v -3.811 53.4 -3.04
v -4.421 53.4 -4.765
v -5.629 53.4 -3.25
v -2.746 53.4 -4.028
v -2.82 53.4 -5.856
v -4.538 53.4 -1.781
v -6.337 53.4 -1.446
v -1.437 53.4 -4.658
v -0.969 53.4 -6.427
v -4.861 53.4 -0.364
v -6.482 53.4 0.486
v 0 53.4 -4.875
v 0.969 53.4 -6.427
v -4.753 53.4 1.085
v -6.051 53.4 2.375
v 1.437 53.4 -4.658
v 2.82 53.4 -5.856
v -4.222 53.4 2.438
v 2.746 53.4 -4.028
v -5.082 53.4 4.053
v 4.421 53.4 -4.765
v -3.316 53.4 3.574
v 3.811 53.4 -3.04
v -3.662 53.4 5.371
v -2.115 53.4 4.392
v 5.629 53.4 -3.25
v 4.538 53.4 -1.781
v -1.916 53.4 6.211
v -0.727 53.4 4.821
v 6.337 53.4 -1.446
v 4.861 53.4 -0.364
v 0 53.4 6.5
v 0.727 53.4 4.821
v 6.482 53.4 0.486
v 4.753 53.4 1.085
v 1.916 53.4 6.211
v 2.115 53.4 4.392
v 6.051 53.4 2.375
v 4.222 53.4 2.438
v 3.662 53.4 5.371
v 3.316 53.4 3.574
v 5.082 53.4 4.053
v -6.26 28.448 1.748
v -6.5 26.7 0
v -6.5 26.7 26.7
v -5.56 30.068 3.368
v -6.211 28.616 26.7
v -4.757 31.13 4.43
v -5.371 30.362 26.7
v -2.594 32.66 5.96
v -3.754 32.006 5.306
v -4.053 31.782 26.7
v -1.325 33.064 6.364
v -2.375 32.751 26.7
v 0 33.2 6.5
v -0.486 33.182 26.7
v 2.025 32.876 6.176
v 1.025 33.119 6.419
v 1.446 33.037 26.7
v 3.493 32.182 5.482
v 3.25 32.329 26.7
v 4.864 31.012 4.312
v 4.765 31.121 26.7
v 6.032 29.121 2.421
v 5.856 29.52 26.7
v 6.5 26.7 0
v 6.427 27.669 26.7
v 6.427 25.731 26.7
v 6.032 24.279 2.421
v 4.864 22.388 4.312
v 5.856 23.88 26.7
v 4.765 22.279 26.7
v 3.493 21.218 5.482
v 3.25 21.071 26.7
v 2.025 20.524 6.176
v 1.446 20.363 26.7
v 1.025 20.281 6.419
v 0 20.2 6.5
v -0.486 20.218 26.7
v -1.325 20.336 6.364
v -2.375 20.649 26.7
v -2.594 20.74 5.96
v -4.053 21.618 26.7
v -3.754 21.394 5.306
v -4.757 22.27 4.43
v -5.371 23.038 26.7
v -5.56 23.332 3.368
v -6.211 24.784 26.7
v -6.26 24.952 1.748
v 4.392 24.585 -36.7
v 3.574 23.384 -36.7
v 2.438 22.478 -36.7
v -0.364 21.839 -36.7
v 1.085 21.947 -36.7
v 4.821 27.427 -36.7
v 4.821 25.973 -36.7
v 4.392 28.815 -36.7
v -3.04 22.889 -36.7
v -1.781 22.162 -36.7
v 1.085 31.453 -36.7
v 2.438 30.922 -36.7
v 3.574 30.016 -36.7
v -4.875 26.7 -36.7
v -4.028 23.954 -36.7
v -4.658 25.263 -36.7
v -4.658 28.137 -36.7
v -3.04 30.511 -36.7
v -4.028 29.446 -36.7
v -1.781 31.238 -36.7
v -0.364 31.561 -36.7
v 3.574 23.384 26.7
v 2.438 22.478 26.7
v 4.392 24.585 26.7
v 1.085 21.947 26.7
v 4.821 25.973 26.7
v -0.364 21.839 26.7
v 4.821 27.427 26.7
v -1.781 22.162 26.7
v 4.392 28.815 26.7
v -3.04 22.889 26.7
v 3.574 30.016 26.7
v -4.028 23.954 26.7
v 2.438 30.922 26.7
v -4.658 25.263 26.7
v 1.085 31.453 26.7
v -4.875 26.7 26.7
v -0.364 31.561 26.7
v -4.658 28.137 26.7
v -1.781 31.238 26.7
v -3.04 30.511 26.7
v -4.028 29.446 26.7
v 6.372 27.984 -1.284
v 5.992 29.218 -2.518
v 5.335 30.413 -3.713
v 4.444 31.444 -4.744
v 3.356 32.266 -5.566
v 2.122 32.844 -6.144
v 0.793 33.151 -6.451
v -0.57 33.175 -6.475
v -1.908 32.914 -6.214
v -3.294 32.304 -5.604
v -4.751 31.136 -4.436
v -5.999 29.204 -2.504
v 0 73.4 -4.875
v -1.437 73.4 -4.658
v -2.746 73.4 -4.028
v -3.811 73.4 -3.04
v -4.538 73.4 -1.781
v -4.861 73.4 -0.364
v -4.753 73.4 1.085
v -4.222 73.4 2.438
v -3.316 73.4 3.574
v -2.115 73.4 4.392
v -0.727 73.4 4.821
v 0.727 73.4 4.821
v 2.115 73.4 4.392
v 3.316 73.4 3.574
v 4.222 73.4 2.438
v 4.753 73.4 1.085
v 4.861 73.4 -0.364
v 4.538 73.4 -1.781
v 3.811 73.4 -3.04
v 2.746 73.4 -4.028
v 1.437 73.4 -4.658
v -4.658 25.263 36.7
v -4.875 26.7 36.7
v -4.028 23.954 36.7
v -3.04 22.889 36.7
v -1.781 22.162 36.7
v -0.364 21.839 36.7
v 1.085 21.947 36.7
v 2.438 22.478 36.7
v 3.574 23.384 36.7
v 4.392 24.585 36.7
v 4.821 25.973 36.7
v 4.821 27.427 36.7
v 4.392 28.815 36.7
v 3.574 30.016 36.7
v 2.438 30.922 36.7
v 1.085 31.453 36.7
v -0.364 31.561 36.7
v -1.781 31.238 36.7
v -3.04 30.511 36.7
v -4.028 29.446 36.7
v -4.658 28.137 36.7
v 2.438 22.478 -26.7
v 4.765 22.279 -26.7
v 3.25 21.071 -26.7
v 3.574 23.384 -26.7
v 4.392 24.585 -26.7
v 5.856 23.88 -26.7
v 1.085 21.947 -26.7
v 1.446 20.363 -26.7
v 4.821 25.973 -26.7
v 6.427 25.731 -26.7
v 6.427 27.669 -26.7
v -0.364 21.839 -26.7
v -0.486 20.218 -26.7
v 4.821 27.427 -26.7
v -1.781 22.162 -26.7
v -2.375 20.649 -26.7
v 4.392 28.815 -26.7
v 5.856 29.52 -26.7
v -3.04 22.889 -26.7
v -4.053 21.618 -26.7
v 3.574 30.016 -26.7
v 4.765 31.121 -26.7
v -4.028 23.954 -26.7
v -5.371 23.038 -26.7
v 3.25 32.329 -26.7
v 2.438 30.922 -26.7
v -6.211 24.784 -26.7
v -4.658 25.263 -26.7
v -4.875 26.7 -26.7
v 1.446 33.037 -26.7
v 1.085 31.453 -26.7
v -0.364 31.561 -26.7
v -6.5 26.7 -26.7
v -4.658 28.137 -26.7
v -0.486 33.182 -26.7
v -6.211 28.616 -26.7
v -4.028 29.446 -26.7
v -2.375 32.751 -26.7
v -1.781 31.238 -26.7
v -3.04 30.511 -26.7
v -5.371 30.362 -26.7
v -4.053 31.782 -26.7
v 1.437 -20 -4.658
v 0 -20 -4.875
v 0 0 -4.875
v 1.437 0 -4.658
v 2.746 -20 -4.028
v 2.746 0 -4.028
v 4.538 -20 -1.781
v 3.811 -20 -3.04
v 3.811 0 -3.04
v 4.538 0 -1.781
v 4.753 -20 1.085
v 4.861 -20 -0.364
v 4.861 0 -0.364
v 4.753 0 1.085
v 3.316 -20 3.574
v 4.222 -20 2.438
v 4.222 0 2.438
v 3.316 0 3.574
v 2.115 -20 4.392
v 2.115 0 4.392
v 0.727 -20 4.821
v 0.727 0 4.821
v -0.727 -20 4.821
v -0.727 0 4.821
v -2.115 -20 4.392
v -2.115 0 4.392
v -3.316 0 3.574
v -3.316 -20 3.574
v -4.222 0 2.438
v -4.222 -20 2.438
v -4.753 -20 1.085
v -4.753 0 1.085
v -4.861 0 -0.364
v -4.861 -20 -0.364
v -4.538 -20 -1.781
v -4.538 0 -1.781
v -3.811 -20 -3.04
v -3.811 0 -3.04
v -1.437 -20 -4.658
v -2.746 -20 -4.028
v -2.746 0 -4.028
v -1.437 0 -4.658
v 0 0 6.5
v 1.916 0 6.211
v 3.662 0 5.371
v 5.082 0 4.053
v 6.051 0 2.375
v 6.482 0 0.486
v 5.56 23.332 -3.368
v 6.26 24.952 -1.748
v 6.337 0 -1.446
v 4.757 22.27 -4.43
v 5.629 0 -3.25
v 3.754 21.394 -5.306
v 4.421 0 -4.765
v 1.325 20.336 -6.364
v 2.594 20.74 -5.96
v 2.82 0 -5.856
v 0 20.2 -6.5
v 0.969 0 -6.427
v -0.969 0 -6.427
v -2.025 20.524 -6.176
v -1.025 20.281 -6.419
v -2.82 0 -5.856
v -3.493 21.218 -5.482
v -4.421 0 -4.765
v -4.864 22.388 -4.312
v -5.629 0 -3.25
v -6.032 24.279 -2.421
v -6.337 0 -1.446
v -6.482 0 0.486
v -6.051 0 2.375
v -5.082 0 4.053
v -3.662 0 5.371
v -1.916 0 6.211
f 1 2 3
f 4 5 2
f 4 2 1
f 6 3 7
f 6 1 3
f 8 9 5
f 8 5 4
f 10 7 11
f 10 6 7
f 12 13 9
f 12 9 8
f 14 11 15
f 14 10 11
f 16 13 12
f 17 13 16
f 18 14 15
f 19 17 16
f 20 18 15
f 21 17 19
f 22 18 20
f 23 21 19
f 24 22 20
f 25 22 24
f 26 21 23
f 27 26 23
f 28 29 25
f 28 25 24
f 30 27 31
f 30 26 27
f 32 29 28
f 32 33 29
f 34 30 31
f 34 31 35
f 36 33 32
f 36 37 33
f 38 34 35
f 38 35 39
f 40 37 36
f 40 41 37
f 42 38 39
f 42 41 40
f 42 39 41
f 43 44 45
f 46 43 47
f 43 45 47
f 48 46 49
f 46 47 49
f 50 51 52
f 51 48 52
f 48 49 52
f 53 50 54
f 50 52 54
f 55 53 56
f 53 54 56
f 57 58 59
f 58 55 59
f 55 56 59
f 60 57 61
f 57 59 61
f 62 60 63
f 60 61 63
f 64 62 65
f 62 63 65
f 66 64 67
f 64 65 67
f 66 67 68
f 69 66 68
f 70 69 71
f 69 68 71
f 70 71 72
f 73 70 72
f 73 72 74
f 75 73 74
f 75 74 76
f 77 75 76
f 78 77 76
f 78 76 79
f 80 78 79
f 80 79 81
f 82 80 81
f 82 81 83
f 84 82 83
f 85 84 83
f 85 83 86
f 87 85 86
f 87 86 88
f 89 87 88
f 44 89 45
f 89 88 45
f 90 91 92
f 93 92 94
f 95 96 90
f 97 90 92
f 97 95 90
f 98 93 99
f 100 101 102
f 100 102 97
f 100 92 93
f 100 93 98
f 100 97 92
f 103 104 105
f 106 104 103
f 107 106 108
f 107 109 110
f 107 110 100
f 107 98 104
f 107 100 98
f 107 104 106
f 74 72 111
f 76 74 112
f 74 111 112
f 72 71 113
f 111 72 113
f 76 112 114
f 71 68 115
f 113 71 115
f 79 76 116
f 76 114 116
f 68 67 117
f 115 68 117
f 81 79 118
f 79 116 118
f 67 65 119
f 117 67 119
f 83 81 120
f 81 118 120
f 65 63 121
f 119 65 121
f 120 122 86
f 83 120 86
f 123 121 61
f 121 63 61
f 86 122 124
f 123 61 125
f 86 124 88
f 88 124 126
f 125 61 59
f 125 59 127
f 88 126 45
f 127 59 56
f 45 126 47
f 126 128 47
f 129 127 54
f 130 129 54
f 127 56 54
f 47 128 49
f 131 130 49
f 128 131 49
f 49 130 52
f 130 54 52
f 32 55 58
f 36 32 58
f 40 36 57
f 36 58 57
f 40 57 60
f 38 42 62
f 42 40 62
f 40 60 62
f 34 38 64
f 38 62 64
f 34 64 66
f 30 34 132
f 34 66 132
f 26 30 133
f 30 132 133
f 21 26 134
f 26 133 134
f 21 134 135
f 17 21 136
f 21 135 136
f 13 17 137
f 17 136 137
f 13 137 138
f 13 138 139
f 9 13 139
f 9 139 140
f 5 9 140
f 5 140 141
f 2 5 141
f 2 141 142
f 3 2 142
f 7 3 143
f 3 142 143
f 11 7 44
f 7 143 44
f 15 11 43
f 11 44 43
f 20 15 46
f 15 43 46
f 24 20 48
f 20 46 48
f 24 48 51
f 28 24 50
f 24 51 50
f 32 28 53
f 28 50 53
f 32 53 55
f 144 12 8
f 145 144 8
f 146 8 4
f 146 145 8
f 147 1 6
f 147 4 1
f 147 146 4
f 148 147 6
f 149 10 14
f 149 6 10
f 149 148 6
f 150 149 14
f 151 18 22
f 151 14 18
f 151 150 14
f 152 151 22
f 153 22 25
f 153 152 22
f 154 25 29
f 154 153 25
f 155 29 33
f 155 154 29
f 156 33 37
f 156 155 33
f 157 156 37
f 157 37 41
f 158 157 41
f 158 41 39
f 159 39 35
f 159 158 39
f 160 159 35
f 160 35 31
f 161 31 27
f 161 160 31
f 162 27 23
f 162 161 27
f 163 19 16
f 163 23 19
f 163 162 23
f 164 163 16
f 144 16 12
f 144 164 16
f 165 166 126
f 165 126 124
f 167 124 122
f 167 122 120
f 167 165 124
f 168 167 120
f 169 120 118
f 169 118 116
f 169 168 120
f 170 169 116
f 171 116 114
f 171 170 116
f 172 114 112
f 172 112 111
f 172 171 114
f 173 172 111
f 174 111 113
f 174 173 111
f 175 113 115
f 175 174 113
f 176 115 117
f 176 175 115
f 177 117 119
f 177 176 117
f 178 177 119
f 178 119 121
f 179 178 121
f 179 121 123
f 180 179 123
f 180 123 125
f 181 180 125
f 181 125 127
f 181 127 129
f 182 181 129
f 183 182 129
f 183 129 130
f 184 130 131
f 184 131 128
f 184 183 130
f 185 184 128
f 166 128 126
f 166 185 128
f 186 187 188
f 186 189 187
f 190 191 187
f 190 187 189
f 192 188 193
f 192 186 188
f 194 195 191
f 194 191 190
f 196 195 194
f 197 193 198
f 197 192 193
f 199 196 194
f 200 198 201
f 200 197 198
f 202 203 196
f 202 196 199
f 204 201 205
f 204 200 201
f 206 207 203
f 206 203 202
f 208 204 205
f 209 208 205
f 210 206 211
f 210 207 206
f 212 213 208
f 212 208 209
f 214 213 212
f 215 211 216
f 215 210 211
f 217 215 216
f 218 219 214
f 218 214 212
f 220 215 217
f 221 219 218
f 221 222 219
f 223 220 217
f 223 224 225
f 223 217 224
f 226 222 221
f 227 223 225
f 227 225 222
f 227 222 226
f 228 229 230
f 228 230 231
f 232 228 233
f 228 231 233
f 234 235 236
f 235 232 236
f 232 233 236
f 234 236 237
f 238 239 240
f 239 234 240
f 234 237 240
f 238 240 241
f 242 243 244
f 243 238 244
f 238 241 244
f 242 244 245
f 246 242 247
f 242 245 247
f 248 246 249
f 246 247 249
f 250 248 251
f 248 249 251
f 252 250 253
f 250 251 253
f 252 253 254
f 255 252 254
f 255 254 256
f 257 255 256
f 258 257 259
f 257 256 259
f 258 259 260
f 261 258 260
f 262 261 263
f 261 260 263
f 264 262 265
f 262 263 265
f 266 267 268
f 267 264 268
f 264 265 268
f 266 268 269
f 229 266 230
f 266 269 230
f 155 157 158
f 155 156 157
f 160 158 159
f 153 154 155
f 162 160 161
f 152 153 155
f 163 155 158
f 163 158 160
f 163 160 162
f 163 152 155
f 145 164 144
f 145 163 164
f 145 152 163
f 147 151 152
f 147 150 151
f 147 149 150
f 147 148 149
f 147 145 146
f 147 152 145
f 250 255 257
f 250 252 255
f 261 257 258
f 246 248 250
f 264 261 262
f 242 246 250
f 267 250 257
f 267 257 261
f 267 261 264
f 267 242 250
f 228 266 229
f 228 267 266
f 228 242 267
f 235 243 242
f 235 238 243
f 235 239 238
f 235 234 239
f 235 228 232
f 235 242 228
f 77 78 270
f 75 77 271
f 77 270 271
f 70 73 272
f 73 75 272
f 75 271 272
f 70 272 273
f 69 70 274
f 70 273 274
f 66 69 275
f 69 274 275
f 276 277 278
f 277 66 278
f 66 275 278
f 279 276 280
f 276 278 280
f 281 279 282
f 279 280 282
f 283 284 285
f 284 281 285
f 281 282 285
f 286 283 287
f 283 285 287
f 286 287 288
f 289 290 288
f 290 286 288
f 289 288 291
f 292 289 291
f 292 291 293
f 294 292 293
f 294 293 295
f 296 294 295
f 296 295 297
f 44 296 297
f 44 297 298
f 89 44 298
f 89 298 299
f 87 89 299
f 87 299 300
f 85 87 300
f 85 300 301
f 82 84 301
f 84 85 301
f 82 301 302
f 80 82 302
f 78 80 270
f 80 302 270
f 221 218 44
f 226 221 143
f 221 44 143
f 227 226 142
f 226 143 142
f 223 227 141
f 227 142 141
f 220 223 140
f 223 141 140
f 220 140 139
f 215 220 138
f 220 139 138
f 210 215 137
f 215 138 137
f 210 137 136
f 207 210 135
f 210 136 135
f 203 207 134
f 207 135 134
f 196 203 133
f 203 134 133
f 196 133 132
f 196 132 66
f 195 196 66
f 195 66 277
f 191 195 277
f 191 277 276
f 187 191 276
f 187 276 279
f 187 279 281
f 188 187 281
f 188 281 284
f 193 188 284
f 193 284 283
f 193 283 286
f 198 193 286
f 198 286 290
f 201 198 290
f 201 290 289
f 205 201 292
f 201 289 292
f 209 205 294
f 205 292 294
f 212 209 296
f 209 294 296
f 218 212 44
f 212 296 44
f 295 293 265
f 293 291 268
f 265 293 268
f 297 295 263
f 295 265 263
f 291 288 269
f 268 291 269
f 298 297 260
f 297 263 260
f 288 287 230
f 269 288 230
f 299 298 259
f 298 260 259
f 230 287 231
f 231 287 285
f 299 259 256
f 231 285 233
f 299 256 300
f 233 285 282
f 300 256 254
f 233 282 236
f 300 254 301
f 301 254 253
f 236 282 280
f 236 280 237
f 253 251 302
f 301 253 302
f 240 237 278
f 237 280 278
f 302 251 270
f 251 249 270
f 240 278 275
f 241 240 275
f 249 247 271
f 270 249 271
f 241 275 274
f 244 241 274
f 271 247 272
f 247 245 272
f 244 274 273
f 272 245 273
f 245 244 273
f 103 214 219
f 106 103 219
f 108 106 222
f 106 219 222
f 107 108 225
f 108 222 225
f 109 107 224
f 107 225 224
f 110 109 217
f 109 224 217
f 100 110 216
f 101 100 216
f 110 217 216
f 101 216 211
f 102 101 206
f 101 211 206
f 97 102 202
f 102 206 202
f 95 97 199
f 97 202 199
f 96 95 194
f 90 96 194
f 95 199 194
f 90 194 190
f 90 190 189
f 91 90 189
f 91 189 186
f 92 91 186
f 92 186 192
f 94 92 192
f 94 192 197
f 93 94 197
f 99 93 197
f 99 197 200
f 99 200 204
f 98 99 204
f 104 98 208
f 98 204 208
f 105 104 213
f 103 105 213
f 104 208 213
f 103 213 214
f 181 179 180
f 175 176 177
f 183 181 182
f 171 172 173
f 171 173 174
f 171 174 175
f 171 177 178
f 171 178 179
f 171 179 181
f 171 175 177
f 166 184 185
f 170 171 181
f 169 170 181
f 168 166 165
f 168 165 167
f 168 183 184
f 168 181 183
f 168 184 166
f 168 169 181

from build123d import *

# Parameters (mm, degrees)
SKETCH1_R                = 6.5
BOSS_EXTRUDE1_DEPTH      = 53.4
SKETCH11_R               = 4.875
BOSS_EXTRUDE2_DEPTH      = 20
BOSS_EXTRUDE3_START      = 20
SKETCH12_R               = 4.875
BOSS_EXTRUDE3_DEPTH      = 20
CIRPATTERN1_COUNT        = 2
BOSS_EXTRUDE4_DEPTH      = 26.7
BOSS_EXTRUDE4_DEPTH_BACK = 26.7
SKETCH13_R               = 6.5
SKETCH14_R               = 4.875
BOSS_EXTRUDE5_DEPTH      = 10
BOSS_EXTRUDE6_START      = 10
SKETCH15_R               = 4.875
BOSS_EXTRUDE6_DEPTH      = 10


with BuildPart() as part:
    # Sketch1 → Boss-Extrude1 (new body)
    with BuildSketch(Plane(origin=(0, 0, 0), x_dir=(1, 0, 0), z_dir=(0, 1, 0))):
        Circle(SKETCH1_R)
    boss_extrude1 = extrude(amount=BOSS_EXTRUDE1_DEPTH)

    # Sketch11 → Boss-Extrude2 (add)
    with BuildSketch(Plane(origin=(0, 0, 0), x_dir=(-1, 0, 0), z_dir=(0, -1, 0))):
        Circle(SKETCH11_R)
    boss_extrude2 = extrude(amount=BOSS_EXTRUDE2_DEPTH)

    # Sketch12 → Boss-Extrude3 (add)
    with BuildSketch(Plane(origin=(0, 53.4, 0), x_dir=(1, 0, 0), z_dir=(0, 1, 0)).offset(BOSS_EXTRUDE3_START)):
        Circle(SKETCH12_R)
    boss_extrude3 = extrude(amount=-BOSS_EXTRUDE3_DEPTH)

    # CirPattern1: Boss-Extrude1, Boss-Extrude2, Boss-Extrude3 ×2 about axis
    cirpattern1_axis = Axis((0, 26.7, 0), (1, 0, 0))
    add([boss_extrude1.rotate(cirpattern1_axis, i * 360 / CIRPATTERN1_COUNT) for i in range(1, CIRPATTERN1_COUNT)])
    add([boss_extrude2.rotate(cirpattern1_axis, i * 360 / CIRPATTERN1_COUNT) for i in range(1, CIRPATTERN1_COUNT)])
    add([boss_extrude3.rotate(cirpattern1_axis, i * 360 / CIRPATTERN1_COUNT) for i in range(1, CIRPATTERN1_COUNT)])

    # Sketch13 → Boss-Extrude4 (add, two sides: drawn at the far end of the back side and taken through both)
    with BuildSketch(Plane(origin=(0, 0, 0), x_dir=(-1, 0, 0), z_dir=(0, 0, -1)).offset(-BOSS_EXTRUDE4_DEPTH_BACK)):
        with Locations((0, 26.7)):
            Circle(SKETCH13_R)
    extrude(amount=BOSS_EXTRUDE4_DEPTH + BOSS_EXTRUDE4_DEPTH_BACK)

    # Sketch14 → Boss-Extrude5 (add)
    with BuildSketch(Plane(origin=(0, 0, -26.7), x_dir=(-1, 0, 0), z_dir=(0, 0, -1))):
        with Locations((0, 26.7)):
            Circle(SKETCH14_R)
    extrude(amount=BOSS_EXTRUDE5_DEPTH)

    # Sketch15 → Boss-Extrude6 (add)
    with BuildSketch(Plane.XY.offset(26.7).offset(BOSS_EXTRUDE6_START)):
        with Locations((0, 26.7)):
            Circle(SKETCH15_R)
    extrude(amount=-BOSS_EXTRUDE6_DEPTH)


solid = part.part
